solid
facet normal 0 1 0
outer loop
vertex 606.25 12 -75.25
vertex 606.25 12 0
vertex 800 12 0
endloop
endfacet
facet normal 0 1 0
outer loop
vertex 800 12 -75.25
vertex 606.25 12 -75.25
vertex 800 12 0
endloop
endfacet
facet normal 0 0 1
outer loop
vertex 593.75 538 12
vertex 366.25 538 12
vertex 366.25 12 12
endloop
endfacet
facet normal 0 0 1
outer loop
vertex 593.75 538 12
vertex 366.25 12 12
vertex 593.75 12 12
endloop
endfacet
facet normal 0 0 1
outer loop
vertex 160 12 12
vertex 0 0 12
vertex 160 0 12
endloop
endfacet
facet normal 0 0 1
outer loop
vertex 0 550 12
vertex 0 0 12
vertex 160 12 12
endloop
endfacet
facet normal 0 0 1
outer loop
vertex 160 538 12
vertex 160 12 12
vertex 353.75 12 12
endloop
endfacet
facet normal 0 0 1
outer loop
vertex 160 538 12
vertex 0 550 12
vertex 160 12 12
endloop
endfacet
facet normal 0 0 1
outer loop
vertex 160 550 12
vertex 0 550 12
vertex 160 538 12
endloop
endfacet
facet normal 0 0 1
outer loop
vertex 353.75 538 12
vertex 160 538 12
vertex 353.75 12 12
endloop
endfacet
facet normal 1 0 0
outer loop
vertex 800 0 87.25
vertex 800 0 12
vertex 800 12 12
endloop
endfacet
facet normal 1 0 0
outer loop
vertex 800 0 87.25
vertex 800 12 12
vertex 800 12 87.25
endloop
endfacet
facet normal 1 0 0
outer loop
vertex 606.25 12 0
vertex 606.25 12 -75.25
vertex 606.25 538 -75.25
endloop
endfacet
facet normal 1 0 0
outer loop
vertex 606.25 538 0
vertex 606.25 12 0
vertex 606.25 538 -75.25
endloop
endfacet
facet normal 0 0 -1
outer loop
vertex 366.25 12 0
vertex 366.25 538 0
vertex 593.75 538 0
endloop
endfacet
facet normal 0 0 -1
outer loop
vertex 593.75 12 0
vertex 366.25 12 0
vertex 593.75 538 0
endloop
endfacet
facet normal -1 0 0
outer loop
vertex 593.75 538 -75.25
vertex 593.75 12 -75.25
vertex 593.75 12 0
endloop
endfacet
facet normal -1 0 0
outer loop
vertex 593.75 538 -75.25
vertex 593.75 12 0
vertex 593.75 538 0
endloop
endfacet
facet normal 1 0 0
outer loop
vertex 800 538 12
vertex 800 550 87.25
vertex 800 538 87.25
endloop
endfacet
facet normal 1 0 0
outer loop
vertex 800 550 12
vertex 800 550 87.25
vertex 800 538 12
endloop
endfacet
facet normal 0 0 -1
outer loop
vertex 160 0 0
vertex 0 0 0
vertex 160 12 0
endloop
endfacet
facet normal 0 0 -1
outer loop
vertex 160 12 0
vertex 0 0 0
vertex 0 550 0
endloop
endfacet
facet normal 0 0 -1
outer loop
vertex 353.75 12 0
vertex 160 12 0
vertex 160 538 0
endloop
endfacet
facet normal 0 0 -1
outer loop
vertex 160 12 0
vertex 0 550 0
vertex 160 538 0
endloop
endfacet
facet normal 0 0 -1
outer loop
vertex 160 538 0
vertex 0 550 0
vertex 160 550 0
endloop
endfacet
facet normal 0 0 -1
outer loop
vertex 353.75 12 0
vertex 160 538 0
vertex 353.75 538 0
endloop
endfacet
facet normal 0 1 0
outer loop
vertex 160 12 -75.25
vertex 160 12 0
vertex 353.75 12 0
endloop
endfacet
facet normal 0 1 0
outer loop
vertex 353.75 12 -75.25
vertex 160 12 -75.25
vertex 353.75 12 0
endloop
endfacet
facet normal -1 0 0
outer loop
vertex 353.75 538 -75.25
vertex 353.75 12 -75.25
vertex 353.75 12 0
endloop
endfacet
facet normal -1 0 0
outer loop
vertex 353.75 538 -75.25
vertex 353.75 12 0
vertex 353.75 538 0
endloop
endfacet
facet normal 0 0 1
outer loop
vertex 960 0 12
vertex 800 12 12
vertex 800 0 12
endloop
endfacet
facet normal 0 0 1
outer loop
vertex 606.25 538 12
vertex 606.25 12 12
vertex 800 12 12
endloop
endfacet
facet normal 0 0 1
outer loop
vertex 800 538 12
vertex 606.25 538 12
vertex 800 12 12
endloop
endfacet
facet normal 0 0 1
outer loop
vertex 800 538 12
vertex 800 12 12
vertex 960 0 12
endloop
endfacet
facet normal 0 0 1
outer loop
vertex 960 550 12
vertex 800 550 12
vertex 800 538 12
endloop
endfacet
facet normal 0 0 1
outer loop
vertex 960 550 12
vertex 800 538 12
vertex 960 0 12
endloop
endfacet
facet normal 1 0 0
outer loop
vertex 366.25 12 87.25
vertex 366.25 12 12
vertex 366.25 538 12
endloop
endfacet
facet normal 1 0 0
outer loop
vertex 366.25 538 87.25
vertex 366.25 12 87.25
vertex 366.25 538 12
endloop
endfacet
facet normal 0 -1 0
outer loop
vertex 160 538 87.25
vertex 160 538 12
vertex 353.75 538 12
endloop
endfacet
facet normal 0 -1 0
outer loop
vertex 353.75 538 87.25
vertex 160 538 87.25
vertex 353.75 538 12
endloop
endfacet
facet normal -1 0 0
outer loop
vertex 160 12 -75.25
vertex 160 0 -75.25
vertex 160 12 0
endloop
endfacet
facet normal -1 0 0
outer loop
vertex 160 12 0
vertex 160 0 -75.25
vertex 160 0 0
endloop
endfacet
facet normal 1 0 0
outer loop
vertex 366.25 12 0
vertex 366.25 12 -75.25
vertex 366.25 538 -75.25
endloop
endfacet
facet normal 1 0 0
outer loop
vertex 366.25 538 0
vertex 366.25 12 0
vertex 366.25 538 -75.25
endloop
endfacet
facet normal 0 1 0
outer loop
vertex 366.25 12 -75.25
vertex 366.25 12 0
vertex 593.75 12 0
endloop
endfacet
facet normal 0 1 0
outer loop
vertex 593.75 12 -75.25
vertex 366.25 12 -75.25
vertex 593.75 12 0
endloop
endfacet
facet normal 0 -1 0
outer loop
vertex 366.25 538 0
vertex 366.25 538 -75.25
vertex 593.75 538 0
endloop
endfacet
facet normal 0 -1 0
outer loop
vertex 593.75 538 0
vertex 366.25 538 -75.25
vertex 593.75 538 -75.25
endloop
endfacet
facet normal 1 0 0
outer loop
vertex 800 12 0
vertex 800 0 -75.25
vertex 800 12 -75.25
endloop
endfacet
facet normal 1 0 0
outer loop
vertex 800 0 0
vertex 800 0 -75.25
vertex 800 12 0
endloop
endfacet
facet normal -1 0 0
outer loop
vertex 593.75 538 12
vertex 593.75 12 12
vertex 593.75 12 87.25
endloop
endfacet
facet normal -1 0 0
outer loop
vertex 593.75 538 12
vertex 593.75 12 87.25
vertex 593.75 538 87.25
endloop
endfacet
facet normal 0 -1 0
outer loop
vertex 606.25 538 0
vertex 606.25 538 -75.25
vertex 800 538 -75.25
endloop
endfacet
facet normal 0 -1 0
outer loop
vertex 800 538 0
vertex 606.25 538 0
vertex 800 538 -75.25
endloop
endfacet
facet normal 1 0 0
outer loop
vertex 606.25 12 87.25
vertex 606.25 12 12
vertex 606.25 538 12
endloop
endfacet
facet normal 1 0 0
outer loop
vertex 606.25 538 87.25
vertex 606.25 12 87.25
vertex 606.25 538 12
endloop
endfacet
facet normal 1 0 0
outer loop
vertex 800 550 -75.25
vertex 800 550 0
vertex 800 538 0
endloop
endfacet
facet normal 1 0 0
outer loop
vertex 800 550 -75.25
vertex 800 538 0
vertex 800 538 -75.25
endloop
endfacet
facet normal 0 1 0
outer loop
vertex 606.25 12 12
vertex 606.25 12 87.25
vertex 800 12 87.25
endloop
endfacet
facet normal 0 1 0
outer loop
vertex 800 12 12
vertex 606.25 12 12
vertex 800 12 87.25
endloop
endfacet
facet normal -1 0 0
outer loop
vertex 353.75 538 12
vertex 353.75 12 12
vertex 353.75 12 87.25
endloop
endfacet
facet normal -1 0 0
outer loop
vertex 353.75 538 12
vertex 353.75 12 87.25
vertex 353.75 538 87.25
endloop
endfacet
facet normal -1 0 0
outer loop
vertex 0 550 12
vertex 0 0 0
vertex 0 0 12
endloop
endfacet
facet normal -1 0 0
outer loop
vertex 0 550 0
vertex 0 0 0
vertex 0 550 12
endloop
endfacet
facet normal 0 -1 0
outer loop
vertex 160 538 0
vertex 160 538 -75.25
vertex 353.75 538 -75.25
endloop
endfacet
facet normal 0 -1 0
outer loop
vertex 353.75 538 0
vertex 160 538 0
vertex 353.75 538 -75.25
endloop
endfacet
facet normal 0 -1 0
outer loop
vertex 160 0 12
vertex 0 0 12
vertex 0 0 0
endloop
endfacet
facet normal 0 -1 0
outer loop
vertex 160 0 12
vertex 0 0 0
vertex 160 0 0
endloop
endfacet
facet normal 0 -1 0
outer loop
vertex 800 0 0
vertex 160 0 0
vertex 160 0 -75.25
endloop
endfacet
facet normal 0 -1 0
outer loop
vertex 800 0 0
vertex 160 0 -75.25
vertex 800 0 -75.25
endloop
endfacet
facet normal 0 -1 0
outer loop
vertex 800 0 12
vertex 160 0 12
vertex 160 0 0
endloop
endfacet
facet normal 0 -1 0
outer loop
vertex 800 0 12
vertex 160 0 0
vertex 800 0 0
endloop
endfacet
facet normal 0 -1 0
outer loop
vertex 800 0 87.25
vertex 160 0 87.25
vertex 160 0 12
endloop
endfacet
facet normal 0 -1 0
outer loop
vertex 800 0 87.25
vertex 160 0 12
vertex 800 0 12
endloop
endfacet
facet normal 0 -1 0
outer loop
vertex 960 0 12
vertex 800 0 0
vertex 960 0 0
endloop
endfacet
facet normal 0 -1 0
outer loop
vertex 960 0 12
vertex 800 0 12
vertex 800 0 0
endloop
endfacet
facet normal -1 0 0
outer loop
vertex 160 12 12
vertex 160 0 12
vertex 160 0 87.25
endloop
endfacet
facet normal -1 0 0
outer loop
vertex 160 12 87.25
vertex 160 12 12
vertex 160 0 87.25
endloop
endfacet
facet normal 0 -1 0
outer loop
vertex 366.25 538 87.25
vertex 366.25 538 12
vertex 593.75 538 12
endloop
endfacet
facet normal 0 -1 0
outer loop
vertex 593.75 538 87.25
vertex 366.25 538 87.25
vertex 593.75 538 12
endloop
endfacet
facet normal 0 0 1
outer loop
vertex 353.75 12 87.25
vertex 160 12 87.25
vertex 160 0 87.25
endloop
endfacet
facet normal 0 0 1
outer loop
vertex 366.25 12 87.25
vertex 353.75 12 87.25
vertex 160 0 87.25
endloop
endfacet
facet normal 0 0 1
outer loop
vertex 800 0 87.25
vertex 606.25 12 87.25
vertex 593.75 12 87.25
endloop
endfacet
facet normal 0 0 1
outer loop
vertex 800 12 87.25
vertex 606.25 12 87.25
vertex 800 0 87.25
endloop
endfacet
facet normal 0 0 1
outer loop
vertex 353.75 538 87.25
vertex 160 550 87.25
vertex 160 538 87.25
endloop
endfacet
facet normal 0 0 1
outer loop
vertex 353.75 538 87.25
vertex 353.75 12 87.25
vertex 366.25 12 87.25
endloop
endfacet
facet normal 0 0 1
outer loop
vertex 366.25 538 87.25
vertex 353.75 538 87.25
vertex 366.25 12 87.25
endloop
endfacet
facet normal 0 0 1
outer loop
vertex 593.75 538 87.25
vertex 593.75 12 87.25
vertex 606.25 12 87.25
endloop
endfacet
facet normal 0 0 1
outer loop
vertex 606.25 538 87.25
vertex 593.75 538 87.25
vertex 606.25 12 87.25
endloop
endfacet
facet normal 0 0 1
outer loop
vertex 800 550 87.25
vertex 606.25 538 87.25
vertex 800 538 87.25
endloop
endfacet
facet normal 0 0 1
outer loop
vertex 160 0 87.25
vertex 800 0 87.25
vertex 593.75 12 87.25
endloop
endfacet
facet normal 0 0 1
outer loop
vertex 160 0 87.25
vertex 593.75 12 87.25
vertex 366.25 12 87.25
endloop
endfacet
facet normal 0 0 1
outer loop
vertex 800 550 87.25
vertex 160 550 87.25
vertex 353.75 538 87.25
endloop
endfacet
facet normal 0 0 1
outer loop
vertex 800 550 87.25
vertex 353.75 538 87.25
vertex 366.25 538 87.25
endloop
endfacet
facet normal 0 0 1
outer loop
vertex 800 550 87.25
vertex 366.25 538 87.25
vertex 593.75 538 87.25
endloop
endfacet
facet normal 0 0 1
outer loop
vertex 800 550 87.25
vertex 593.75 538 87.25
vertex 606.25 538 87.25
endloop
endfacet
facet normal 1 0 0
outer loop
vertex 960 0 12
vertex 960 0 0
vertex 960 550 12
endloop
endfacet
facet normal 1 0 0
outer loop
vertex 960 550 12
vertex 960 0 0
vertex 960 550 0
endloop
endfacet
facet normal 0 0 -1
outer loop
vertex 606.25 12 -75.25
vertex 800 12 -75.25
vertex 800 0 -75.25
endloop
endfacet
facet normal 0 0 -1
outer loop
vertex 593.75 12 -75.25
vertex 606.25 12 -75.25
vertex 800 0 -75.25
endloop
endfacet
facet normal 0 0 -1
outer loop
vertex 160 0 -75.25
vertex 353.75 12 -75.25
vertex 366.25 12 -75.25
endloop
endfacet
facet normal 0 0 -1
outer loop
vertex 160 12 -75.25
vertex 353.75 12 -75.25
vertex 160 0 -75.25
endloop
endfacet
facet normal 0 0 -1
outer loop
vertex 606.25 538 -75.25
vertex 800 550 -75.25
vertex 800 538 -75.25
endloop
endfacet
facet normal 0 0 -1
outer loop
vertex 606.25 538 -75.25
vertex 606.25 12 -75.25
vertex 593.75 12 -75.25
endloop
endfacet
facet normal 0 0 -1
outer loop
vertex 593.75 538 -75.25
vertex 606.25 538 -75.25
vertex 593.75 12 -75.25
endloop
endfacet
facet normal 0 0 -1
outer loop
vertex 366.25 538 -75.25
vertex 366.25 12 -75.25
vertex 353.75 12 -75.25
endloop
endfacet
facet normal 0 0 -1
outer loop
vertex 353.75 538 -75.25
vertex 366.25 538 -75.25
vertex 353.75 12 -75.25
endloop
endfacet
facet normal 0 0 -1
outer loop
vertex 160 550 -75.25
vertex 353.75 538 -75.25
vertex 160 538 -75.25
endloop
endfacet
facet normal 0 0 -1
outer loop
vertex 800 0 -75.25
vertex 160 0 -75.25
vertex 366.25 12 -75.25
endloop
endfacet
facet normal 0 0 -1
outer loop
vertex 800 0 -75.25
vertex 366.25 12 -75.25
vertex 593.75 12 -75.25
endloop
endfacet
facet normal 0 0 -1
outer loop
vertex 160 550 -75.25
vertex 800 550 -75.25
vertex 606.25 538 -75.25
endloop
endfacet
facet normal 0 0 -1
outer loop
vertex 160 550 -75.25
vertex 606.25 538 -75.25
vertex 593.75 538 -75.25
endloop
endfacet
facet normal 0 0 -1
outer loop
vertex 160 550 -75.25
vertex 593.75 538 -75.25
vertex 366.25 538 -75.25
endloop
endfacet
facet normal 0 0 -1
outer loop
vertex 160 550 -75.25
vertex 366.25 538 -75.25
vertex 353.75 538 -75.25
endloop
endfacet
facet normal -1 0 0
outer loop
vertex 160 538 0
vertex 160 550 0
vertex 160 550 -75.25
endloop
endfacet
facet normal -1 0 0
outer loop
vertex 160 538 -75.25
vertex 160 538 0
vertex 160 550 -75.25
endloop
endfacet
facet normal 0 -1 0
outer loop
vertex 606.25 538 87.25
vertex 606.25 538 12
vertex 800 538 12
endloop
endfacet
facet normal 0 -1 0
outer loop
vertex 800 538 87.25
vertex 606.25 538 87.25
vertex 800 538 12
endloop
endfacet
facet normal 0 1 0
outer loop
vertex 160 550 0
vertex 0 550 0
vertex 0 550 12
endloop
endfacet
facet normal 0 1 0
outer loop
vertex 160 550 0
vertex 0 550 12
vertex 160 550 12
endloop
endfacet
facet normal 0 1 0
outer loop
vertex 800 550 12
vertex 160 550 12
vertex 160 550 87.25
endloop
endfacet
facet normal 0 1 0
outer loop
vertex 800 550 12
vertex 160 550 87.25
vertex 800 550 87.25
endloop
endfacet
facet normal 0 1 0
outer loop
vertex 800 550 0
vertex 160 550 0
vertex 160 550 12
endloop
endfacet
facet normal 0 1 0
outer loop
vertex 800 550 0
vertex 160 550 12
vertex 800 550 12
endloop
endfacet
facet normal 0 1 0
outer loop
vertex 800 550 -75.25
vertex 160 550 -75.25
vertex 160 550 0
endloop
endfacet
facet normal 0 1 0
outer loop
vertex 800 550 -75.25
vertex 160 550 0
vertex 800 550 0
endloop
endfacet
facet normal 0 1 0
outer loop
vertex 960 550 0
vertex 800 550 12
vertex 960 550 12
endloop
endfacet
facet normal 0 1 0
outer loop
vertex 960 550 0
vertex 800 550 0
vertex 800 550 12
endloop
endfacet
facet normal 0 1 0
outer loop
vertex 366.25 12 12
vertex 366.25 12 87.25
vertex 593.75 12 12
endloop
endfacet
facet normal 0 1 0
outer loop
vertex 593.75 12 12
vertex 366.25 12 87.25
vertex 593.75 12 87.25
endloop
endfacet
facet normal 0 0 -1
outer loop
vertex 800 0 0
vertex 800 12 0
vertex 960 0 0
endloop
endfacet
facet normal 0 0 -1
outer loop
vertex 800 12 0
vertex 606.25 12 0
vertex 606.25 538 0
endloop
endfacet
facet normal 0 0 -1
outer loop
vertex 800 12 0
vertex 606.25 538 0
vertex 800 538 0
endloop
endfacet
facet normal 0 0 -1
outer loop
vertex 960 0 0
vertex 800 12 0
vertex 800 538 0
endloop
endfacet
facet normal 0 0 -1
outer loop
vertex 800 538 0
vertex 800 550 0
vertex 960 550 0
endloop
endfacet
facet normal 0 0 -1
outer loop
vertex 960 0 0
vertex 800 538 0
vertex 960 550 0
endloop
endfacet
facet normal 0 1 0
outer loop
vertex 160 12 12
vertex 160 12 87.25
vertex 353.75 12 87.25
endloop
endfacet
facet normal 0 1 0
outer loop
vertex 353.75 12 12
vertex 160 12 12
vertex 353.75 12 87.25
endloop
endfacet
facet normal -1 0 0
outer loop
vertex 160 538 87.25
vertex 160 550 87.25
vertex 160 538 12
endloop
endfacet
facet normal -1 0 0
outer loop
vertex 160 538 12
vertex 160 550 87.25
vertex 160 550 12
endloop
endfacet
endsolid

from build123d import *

# Parameters (mm, degrees)
SKETCH_1_W      = 960
SKETCH_1_H      = 550
EXTRUDE_1_DEPTH = 12
SKETCH_2_W      = 640
SKETCH_2_H      = 162.5
EXTRUDE_2_DEPTH = 12
SKETCH_3_W      = 640
SKETCH_3_H      = 162.5
EXTRUDE_3_DEPTH = 12
SKETCH_4_W      = 12.5
SKETCH_4_H      = 526
EXTRUDE_4_DEPTH = 162.5


with BuildPart() as part:
    # 草图1 → 凸台-拉伸1 (new body)
    with BuildSketch(Plane.XY):
        with Locations((480, 275)):
            Rectangle(SKETCH_1_W, SKETCH_1_H)
    extrude(amount=EXTRUDE_1_DEPTH)

    # 草图2 → 凸台-拉伸2 (add)
    with BuildSketch(Plane(origin=(0, 550, 0), x_dir=(1, 0, 0), z_dir=(0, 1, 0))):
        with Locations((480, -6)):
            Rectangle(SKETCH_2_W, SKETCH_2_H)
    extrude(amount=-EXTRUDE_2_DEPTH)

    # 草图3 → 凸台-拉伸3 (add)
    with BuildSketch(Plane.XZ):
        with Locations((480, 6)):
            Rectangle(SKETCH_3_W, SKETCH_3_H)
    extrude(amount=-EXTRUDE_3_DEPTH)

    # 草图4 → 凸台-拉伸4 (add)
    with BuildSketch(Plane(origin=(0, 0, -75.25), x_dir=(-1, 0, 0), z_dir=(0, 0, -1))):
        with Locations((-600, 275)):
            Rectangle(SKETCH_4_W, SKETCH_4_H)
        with Locations((-360, 275)):
            Rectangle(SKETCH_4_W, SKETCH_4_H)
    extrude(amount=-EXTRUDE_4_DEPTH)


solid = part.part
